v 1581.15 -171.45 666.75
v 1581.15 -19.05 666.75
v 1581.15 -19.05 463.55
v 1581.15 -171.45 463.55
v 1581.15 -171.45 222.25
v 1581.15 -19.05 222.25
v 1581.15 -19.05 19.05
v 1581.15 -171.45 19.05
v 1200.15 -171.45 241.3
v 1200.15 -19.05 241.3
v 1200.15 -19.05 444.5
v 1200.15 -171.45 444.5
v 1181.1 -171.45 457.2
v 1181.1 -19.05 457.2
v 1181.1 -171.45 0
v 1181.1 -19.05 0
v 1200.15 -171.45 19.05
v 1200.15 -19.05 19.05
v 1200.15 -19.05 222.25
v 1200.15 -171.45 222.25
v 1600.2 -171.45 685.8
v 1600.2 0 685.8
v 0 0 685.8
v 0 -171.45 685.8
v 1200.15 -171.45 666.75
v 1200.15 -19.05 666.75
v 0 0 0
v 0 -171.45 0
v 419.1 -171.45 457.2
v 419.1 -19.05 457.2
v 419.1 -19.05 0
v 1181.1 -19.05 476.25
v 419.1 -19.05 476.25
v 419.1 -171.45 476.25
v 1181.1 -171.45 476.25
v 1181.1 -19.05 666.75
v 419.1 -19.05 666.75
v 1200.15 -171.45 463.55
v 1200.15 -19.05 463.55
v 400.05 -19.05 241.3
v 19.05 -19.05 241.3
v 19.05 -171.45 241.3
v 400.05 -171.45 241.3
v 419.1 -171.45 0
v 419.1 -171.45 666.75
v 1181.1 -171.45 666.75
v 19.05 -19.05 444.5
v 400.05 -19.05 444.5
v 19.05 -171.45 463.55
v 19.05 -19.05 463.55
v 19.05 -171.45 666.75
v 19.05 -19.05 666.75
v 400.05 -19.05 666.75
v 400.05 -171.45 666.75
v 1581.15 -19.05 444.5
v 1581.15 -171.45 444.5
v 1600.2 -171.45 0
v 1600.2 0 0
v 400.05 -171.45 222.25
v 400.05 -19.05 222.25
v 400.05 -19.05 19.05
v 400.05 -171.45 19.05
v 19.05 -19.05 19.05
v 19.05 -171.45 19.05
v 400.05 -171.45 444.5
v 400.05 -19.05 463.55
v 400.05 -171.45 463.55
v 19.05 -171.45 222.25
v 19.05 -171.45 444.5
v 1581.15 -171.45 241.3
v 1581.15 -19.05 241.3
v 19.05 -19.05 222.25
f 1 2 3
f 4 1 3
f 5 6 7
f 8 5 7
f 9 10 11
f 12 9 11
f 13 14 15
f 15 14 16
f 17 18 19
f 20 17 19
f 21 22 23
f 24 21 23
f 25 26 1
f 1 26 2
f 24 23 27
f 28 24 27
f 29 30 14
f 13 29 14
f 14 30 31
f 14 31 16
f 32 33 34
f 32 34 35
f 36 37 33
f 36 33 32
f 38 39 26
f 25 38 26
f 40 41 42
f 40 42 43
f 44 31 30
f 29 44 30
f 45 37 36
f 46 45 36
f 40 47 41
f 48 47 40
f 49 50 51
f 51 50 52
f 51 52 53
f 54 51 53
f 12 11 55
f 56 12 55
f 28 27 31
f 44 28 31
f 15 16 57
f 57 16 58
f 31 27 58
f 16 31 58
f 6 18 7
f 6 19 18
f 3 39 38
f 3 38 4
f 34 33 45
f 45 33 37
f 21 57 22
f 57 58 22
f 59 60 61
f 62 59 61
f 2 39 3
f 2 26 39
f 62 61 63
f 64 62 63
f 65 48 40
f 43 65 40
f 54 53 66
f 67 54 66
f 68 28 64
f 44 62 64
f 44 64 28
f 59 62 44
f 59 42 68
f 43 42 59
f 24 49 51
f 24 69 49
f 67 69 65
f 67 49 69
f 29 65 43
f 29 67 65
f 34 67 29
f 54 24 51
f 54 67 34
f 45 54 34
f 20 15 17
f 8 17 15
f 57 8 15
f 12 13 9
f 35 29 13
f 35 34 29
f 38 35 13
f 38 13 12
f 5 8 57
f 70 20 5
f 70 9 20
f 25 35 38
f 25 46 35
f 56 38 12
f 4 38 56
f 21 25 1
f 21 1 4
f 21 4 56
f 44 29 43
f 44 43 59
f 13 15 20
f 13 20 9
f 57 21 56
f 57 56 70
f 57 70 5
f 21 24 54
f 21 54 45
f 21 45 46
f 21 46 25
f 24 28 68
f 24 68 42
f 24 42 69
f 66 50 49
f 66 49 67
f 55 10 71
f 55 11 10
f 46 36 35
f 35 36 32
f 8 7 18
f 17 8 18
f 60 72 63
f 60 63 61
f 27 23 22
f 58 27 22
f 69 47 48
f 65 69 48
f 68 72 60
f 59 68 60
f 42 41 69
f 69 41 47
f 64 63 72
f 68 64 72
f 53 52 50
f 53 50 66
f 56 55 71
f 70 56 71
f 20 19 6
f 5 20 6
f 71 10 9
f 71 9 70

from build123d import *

# Parameters (mm, degrees)
F0_W      = 1600.2
F0_H      = 685.8
F1_DEPTH  = 19.05
F3_DEPTH  = 152.4
F5_DEPTH  = 152.4
F6_W      = 762
F6_H      = 19.05
F7_DEPTH  = 152.4
F8_W      = 381
F8_H      = 19.05
F9_DEPTH  = 152.4
F10_W     = 381
F10_H     = 19.05
F11_DEPTH = 152.4


with BuildPart() as f1:
    # F0 (on Front) → F1 (new body)
    with BuildSketch(Plane.XZ):
        with Locations((800.1, 342.9)):
            Rectangle(F0_W, F0_H)
    extrude(amount=F1_DEPTH)

    # F2 (on face) → F3 (join)
    with BuildSketch(Plane.XZ.offset(19.05)):
        Polygon((0, 685.8), (0, 0), (19.05, 0), (19.05, 666.75), (1581.15, 666.75), (1581.15, 0), (1600.2, 0), (1600.2, 685.8), align=None)
    extrude(amount=F3_DEPTH)

    # F4 (on face) → F5 (join)
    with BuildSketch(Plane.XZ.offset(19.05)):
        Polygon((419.1, 0), (419.1, 666.75), (400.05, 666.75), (400.05, 19.05), (19.05, 19.05), (19.05, 0), align=None)
        Polygon((1200.15, 666.75), (1181.1, 666.75), (1181.1, 0), (1581.15, 0), (1581.15, 19.05), (1200.15, 19.05), align=None)
    extrude(amount=F5_DEPTH)

    # F6 (on face) → F7 (join)
    with BuildSketch(Plane.XZ.offset(19.05)):
        with Locations((800.1, 466.725)):
            Rectangle(F6_W, F6_H)
    extrude(amount=F7_DEPTH)

    # F8 (on face) → F9 (join)
    with BuildSketch(Plane.XZ.offset(19.05)):
        with Locations((209.55, 454.025)):
            Rectangle(F8_W, F8_H)
        with Locations((209.55, 231.775)):
            Rectangle(F8_W, F8_H)
    extrude(amount=F9_DEPTH)

    # F10 (on face) → F11 (join)
    with BuildSketch(Plane.XZ.offset(19.05)):
        with Locations((1390.65, 454.025)):
            Rectangle(F10_W, F10_H)
        with Locations((1390.65, 231.775)):
            Rectangle(F10_W, F10_H)
    extrude(amount=F11_DEPTH)


solid = f1.part
